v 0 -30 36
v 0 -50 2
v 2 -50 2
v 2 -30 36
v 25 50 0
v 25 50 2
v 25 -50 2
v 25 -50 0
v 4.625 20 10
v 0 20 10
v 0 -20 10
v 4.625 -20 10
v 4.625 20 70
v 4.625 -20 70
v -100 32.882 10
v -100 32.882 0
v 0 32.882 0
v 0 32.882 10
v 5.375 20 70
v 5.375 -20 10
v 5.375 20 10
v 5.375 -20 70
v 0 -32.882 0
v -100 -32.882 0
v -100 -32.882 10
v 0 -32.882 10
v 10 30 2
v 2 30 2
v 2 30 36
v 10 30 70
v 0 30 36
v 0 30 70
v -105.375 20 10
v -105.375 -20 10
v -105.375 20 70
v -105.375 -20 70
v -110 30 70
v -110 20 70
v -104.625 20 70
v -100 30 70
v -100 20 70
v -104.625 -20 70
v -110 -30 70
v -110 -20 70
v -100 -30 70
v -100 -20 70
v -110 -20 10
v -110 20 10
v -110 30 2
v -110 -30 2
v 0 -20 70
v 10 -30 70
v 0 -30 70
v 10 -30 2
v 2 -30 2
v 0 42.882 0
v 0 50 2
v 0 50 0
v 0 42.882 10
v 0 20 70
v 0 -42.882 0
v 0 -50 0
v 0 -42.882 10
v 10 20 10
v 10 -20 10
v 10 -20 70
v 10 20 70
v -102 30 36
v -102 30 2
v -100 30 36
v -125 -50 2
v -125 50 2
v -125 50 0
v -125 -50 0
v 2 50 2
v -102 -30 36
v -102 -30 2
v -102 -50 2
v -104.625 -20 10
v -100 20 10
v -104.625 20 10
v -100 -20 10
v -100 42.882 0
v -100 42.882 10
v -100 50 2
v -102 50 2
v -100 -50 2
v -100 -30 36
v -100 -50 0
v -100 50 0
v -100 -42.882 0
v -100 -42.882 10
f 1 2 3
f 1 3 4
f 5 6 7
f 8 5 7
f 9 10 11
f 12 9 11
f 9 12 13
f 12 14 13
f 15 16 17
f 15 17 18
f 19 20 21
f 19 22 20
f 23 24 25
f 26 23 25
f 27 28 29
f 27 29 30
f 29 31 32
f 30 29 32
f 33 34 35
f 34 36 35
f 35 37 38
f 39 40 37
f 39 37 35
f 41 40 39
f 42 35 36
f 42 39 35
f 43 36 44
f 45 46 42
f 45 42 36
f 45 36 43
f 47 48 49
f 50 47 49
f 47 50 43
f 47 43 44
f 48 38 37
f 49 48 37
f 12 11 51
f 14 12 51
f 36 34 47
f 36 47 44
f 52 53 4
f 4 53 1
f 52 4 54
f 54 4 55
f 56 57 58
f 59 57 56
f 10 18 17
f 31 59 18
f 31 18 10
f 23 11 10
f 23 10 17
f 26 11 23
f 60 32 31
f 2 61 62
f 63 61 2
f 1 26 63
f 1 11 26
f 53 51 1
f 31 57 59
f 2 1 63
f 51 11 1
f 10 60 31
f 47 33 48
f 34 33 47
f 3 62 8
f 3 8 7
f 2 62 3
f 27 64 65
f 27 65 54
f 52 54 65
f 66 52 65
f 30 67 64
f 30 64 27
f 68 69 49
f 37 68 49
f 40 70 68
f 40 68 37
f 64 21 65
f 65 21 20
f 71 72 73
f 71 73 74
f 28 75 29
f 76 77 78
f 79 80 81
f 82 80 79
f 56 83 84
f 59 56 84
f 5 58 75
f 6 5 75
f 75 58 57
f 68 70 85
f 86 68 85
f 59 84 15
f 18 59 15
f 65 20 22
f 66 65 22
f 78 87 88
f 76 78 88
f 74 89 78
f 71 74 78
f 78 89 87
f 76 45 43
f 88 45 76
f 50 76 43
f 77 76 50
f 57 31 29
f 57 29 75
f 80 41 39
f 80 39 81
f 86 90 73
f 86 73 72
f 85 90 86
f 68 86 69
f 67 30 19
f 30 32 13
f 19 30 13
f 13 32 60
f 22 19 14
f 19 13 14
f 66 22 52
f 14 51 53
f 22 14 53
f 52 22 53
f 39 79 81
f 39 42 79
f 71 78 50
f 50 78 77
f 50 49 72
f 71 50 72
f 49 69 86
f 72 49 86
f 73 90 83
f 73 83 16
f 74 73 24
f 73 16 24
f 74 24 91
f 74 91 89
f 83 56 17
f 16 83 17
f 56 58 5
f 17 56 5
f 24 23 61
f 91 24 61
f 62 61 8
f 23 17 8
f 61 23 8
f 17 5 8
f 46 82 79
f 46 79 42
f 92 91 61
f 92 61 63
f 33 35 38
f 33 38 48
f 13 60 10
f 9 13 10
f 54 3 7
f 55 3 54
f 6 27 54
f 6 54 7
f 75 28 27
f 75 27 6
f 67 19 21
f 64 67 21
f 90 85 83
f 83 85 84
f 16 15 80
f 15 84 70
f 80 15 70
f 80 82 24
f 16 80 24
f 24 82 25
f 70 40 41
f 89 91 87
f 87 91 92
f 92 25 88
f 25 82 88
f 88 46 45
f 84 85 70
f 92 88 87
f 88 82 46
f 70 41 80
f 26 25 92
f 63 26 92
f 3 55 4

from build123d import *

# Parameters (mm, degrees)
F1_DEPTH  = 10
F4_DEPTH  = 0.375
F5_W      = 20
F5_H      = 2
F6_DEPTH  = 25
F8_DEPTH  = 2
F9_W      = 10
F9_H      = 10
F10_DEPTH = 50


with BuildPart() as f1:
    # F0 (on Right) → F1 (new body)
    with BuildSketch(Plane.YZ):
        Polygon((-30, 0), (0, 0), (30, 0), (30, 70), (20, 70), (20, 10), (-20, 10), (-20, 70), (-30, 70), align=None)
    extrude(amount=F1_DEPTH)

    # F3 (on offset) → F4 (join, symmetric)
    with BuildSketch(Plane.YZ.offset(5)):
        Polygon((-20, 10), (0, 10), (20, 10), (20, 70), (-20, 70), align=None)
    extrude(amount=F4_DEPTH, both=True)

    # F5 (on face) → F6 (join)
    with BuildSketch(Plane(origin=(0, 0, 0), x_dir=(0, -1, 0), z_dir=(-1, 0, 0))):
        Polygon((-30, 0), (0, 0), (30, 0), (30, 2), (-30, 2), align=None)
        with Locations((40, 1)):
            Rectangle(F5_W, F5_H)
        with Locations((-40, 1)):
            Rectangle(F5_W, F5_H)
    extrude(amount=-F6_DEPTH)

    # F7 (on face) → F8 (join)
    with BuildSketch(Plane(origin=(0, 0, 0), x_dir=(0, -1, 0), z_dir=(-1, 0, 0))):
        Polygon((-50, 2), (-30, 2), (-30, 36), align=None)
        Polygon((30, 2), (50, 2), (30, 36), align=None)
    extrude(amount=-F8_DEPTH)

    # F9 (on face) → F10 (join)
    with BuildSketch(Plane(origin=(0, 0, 0), x_dir=(0, -1, 0), z_dir=(-1, 0, 0))):
        with Locations((-37.8820885718, 5)):
            Rectangle(F9_W, F9_H)
        with Locations((37.8820885718, 5)):
            Rectangle(F9_W, F9_H)
    extrude(amount=F10_DEPTH)

    # F12: F1 across plane


with BuildPart() as f1_1:
    add(f1.part)
    add(f1.part.mirror(Plane.YZ.offset(-50)))


solid = f1_1.part
